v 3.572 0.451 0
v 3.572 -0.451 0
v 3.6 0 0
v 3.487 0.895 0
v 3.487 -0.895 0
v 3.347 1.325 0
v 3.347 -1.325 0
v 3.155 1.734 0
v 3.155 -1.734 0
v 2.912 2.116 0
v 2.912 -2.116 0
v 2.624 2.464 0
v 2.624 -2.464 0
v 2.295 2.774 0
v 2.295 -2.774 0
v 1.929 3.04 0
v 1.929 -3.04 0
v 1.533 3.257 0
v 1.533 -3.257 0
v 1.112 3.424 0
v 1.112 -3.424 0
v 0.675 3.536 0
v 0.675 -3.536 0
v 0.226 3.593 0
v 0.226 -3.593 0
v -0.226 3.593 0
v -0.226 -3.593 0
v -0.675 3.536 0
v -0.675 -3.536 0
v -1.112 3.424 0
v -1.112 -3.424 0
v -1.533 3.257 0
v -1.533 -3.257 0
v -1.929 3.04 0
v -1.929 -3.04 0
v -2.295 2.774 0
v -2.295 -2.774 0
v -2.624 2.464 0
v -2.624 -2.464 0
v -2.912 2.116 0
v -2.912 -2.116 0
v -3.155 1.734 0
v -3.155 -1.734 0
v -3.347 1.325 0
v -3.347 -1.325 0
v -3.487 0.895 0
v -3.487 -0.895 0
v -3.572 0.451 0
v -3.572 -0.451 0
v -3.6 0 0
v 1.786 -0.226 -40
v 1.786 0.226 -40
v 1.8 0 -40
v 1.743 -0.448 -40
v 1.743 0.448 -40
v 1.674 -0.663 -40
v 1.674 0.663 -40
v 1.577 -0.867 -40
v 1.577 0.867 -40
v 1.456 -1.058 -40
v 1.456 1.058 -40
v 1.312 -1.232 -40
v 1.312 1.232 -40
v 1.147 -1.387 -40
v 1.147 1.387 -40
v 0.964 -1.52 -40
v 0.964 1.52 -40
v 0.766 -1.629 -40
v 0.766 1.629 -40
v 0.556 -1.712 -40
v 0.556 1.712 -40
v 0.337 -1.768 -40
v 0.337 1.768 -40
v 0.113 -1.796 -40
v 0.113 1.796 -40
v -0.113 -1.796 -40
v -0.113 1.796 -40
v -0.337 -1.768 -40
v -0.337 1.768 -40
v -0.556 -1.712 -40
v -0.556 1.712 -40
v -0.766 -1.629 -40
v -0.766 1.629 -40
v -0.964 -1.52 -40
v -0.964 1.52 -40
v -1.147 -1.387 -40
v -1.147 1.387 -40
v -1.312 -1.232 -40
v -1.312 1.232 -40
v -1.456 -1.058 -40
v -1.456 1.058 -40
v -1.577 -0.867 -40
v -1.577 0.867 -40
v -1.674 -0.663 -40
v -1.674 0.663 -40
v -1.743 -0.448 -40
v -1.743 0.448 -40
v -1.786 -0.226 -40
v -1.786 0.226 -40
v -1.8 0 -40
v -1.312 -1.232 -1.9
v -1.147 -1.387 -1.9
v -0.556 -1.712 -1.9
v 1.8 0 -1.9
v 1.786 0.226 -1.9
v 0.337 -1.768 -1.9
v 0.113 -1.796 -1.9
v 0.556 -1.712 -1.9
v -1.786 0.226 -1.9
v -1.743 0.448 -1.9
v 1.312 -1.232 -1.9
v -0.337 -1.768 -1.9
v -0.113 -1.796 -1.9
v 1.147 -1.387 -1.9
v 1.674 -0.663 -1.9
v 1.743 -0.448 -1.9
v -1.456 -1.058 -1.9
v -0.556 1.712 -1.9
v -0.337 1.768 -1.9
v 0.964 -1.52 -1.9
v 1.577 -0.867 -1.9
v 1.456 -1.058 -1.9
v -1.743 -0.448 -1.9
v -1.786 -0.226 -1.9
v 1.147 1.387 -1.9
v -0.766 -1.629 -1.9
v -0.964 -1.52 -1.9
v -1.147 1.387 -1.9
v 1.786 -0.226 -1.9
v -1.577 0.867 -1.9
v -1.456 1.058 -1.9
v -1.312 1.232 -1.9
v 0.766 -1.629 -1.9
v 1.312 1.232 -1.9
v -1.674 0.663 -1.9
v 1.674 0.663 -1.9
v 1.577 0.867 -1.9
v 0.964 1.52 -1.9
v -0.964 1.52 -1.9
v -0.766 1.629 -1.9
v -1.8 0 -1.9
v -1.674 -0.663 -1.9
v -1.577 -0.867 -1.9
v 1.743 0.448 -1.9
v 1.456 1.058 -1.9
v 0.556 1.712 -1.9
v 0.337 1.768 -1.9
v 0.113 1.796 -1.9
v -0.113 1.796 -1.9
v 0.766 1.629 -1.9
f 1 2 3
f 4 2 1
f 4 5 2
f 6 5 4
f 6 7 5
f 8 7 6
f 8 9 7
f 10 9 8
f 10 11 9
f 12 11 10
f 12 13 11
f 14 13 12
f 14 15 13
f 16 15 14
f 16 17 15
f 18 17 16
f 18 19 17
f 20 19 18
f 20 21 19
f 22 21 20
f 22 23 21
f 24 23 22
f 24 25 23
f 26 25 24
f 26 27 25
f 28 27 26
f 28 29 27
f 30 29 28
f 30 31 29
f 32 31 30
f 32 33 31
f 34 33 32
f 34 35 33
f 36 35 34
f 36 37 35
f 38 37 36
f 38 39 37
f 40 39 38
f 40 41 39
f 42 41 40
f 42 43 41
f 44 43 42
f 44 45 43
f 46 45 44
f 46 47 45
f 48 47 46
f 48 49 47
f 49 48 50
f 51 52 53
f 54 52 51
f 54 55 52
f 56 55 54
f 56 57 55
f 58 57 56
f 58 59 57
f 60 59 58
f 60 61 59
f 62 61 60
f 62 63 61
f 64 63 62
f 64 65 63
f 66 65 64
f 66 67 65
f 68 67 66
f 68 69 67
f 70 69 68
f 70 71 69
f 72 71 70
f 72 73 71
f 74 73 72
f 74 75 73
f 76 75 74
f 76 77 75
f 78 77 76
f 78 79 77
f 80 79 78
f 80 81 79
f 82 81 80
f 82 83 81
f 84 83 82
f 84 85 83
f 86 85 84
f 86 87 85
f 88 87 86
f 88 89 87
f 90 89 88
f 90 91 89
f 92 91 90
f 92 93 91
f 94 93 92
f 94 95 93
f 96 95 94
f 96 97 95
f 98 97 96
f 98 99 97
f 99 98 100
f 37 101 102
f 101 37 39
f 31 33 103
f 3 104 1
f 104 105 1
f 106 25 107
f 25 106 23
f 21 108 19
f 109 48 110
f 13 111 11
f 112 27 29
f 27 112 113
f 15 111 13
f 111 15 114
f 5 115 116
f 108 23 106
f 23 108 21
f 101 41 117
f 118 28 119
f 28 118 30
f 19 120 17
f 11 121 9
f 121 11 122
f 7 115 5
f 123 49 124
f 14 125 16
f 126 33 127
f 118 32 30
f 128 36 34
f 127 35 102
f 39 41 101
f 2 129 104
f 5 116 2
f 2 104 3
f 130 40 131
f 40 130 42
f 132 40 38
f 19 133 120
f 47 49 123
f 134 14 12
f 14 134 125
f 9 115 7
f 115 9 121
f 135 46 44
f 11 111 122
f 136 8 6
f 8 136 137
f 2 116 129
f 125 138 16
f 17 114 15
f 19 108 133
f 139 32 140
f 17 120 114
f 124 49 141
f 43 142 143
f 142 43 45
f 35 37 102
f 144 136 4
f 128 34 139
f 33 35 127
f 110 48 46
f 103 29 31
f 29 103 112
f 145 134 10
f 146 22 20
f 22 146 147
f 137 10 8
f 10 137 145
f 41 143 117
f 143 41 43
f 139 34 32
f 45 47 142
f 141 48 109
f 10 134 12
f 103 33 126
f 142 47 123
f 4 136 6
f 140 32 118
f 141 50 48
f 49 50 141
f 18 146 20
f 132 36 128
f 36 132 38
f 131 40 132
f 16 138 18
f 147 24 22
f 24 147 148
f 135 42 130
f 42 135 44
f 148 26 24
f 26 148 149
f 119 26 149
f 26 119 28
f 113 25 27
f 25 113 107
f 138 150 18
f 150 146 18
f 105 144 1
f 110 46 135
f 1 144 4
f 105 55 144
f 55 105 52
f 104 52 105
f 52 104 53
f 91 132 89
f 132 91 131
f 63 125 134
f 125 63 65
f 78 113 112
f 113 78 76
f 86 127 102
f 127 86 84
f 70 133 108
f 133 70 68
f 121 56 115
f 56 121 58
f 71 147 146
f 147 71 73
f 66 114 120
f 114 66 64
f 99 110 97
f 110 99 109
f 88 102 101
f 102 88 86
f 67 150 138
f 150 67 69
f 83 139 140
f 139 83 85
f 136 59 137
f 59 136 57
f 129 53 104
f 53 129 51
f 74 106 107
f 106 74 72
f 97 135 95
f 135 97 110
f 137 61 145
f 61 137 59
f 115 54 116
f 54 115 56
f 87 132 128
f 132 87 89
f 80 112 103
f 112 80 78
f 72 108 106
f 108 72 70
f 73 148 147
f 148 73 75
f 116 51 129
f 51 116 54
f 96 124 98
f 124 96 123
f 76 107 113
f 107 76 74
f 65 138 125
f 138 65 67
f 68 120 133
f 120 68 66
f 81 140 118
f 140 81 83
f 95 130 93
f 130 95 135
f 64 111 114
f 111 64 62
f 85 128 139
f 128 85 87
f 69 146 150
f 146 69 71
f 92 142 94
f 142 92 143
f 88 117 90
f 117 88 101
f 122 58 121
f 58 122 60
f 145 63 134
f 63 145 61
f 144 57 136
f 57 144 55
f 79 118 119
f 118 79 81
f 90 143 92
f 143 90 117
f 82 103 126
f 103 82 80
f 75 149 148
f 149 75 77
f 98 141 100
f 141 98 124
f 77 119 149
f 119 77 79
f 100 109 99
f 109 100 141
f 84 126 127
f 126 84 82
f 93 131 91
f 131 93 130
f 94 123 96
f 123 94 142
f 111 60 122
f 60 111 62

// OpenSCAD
$fn = 50;


difference() {
	union() {
		translate(v = [0, 0, 0]) {
			rotate(a = [0, 0, 0]) {
				difference() {
					union() {
						translate(v = [0, 0, -40.0000000000]) {
							cylinder(h = 40, r = 1.5000000000);
						}
						translate(v = [0, 0, -1.9000000000]) {
							cylinder(h = 1.9000000000, r1 = 1.8000000000, r2 = 3.6000000000);
						}
						translate(v = [0, 0, -40.0000000000]) {
							cylinder(h = 40, r = 1.8000000000);
						}
						translate(v = [0, 0, -40.0000000000]) {
							cylinder(h = 40, r = 1.5000000000);
						}
					}
					union();
				}
			}
		}
	}
	union();
}
